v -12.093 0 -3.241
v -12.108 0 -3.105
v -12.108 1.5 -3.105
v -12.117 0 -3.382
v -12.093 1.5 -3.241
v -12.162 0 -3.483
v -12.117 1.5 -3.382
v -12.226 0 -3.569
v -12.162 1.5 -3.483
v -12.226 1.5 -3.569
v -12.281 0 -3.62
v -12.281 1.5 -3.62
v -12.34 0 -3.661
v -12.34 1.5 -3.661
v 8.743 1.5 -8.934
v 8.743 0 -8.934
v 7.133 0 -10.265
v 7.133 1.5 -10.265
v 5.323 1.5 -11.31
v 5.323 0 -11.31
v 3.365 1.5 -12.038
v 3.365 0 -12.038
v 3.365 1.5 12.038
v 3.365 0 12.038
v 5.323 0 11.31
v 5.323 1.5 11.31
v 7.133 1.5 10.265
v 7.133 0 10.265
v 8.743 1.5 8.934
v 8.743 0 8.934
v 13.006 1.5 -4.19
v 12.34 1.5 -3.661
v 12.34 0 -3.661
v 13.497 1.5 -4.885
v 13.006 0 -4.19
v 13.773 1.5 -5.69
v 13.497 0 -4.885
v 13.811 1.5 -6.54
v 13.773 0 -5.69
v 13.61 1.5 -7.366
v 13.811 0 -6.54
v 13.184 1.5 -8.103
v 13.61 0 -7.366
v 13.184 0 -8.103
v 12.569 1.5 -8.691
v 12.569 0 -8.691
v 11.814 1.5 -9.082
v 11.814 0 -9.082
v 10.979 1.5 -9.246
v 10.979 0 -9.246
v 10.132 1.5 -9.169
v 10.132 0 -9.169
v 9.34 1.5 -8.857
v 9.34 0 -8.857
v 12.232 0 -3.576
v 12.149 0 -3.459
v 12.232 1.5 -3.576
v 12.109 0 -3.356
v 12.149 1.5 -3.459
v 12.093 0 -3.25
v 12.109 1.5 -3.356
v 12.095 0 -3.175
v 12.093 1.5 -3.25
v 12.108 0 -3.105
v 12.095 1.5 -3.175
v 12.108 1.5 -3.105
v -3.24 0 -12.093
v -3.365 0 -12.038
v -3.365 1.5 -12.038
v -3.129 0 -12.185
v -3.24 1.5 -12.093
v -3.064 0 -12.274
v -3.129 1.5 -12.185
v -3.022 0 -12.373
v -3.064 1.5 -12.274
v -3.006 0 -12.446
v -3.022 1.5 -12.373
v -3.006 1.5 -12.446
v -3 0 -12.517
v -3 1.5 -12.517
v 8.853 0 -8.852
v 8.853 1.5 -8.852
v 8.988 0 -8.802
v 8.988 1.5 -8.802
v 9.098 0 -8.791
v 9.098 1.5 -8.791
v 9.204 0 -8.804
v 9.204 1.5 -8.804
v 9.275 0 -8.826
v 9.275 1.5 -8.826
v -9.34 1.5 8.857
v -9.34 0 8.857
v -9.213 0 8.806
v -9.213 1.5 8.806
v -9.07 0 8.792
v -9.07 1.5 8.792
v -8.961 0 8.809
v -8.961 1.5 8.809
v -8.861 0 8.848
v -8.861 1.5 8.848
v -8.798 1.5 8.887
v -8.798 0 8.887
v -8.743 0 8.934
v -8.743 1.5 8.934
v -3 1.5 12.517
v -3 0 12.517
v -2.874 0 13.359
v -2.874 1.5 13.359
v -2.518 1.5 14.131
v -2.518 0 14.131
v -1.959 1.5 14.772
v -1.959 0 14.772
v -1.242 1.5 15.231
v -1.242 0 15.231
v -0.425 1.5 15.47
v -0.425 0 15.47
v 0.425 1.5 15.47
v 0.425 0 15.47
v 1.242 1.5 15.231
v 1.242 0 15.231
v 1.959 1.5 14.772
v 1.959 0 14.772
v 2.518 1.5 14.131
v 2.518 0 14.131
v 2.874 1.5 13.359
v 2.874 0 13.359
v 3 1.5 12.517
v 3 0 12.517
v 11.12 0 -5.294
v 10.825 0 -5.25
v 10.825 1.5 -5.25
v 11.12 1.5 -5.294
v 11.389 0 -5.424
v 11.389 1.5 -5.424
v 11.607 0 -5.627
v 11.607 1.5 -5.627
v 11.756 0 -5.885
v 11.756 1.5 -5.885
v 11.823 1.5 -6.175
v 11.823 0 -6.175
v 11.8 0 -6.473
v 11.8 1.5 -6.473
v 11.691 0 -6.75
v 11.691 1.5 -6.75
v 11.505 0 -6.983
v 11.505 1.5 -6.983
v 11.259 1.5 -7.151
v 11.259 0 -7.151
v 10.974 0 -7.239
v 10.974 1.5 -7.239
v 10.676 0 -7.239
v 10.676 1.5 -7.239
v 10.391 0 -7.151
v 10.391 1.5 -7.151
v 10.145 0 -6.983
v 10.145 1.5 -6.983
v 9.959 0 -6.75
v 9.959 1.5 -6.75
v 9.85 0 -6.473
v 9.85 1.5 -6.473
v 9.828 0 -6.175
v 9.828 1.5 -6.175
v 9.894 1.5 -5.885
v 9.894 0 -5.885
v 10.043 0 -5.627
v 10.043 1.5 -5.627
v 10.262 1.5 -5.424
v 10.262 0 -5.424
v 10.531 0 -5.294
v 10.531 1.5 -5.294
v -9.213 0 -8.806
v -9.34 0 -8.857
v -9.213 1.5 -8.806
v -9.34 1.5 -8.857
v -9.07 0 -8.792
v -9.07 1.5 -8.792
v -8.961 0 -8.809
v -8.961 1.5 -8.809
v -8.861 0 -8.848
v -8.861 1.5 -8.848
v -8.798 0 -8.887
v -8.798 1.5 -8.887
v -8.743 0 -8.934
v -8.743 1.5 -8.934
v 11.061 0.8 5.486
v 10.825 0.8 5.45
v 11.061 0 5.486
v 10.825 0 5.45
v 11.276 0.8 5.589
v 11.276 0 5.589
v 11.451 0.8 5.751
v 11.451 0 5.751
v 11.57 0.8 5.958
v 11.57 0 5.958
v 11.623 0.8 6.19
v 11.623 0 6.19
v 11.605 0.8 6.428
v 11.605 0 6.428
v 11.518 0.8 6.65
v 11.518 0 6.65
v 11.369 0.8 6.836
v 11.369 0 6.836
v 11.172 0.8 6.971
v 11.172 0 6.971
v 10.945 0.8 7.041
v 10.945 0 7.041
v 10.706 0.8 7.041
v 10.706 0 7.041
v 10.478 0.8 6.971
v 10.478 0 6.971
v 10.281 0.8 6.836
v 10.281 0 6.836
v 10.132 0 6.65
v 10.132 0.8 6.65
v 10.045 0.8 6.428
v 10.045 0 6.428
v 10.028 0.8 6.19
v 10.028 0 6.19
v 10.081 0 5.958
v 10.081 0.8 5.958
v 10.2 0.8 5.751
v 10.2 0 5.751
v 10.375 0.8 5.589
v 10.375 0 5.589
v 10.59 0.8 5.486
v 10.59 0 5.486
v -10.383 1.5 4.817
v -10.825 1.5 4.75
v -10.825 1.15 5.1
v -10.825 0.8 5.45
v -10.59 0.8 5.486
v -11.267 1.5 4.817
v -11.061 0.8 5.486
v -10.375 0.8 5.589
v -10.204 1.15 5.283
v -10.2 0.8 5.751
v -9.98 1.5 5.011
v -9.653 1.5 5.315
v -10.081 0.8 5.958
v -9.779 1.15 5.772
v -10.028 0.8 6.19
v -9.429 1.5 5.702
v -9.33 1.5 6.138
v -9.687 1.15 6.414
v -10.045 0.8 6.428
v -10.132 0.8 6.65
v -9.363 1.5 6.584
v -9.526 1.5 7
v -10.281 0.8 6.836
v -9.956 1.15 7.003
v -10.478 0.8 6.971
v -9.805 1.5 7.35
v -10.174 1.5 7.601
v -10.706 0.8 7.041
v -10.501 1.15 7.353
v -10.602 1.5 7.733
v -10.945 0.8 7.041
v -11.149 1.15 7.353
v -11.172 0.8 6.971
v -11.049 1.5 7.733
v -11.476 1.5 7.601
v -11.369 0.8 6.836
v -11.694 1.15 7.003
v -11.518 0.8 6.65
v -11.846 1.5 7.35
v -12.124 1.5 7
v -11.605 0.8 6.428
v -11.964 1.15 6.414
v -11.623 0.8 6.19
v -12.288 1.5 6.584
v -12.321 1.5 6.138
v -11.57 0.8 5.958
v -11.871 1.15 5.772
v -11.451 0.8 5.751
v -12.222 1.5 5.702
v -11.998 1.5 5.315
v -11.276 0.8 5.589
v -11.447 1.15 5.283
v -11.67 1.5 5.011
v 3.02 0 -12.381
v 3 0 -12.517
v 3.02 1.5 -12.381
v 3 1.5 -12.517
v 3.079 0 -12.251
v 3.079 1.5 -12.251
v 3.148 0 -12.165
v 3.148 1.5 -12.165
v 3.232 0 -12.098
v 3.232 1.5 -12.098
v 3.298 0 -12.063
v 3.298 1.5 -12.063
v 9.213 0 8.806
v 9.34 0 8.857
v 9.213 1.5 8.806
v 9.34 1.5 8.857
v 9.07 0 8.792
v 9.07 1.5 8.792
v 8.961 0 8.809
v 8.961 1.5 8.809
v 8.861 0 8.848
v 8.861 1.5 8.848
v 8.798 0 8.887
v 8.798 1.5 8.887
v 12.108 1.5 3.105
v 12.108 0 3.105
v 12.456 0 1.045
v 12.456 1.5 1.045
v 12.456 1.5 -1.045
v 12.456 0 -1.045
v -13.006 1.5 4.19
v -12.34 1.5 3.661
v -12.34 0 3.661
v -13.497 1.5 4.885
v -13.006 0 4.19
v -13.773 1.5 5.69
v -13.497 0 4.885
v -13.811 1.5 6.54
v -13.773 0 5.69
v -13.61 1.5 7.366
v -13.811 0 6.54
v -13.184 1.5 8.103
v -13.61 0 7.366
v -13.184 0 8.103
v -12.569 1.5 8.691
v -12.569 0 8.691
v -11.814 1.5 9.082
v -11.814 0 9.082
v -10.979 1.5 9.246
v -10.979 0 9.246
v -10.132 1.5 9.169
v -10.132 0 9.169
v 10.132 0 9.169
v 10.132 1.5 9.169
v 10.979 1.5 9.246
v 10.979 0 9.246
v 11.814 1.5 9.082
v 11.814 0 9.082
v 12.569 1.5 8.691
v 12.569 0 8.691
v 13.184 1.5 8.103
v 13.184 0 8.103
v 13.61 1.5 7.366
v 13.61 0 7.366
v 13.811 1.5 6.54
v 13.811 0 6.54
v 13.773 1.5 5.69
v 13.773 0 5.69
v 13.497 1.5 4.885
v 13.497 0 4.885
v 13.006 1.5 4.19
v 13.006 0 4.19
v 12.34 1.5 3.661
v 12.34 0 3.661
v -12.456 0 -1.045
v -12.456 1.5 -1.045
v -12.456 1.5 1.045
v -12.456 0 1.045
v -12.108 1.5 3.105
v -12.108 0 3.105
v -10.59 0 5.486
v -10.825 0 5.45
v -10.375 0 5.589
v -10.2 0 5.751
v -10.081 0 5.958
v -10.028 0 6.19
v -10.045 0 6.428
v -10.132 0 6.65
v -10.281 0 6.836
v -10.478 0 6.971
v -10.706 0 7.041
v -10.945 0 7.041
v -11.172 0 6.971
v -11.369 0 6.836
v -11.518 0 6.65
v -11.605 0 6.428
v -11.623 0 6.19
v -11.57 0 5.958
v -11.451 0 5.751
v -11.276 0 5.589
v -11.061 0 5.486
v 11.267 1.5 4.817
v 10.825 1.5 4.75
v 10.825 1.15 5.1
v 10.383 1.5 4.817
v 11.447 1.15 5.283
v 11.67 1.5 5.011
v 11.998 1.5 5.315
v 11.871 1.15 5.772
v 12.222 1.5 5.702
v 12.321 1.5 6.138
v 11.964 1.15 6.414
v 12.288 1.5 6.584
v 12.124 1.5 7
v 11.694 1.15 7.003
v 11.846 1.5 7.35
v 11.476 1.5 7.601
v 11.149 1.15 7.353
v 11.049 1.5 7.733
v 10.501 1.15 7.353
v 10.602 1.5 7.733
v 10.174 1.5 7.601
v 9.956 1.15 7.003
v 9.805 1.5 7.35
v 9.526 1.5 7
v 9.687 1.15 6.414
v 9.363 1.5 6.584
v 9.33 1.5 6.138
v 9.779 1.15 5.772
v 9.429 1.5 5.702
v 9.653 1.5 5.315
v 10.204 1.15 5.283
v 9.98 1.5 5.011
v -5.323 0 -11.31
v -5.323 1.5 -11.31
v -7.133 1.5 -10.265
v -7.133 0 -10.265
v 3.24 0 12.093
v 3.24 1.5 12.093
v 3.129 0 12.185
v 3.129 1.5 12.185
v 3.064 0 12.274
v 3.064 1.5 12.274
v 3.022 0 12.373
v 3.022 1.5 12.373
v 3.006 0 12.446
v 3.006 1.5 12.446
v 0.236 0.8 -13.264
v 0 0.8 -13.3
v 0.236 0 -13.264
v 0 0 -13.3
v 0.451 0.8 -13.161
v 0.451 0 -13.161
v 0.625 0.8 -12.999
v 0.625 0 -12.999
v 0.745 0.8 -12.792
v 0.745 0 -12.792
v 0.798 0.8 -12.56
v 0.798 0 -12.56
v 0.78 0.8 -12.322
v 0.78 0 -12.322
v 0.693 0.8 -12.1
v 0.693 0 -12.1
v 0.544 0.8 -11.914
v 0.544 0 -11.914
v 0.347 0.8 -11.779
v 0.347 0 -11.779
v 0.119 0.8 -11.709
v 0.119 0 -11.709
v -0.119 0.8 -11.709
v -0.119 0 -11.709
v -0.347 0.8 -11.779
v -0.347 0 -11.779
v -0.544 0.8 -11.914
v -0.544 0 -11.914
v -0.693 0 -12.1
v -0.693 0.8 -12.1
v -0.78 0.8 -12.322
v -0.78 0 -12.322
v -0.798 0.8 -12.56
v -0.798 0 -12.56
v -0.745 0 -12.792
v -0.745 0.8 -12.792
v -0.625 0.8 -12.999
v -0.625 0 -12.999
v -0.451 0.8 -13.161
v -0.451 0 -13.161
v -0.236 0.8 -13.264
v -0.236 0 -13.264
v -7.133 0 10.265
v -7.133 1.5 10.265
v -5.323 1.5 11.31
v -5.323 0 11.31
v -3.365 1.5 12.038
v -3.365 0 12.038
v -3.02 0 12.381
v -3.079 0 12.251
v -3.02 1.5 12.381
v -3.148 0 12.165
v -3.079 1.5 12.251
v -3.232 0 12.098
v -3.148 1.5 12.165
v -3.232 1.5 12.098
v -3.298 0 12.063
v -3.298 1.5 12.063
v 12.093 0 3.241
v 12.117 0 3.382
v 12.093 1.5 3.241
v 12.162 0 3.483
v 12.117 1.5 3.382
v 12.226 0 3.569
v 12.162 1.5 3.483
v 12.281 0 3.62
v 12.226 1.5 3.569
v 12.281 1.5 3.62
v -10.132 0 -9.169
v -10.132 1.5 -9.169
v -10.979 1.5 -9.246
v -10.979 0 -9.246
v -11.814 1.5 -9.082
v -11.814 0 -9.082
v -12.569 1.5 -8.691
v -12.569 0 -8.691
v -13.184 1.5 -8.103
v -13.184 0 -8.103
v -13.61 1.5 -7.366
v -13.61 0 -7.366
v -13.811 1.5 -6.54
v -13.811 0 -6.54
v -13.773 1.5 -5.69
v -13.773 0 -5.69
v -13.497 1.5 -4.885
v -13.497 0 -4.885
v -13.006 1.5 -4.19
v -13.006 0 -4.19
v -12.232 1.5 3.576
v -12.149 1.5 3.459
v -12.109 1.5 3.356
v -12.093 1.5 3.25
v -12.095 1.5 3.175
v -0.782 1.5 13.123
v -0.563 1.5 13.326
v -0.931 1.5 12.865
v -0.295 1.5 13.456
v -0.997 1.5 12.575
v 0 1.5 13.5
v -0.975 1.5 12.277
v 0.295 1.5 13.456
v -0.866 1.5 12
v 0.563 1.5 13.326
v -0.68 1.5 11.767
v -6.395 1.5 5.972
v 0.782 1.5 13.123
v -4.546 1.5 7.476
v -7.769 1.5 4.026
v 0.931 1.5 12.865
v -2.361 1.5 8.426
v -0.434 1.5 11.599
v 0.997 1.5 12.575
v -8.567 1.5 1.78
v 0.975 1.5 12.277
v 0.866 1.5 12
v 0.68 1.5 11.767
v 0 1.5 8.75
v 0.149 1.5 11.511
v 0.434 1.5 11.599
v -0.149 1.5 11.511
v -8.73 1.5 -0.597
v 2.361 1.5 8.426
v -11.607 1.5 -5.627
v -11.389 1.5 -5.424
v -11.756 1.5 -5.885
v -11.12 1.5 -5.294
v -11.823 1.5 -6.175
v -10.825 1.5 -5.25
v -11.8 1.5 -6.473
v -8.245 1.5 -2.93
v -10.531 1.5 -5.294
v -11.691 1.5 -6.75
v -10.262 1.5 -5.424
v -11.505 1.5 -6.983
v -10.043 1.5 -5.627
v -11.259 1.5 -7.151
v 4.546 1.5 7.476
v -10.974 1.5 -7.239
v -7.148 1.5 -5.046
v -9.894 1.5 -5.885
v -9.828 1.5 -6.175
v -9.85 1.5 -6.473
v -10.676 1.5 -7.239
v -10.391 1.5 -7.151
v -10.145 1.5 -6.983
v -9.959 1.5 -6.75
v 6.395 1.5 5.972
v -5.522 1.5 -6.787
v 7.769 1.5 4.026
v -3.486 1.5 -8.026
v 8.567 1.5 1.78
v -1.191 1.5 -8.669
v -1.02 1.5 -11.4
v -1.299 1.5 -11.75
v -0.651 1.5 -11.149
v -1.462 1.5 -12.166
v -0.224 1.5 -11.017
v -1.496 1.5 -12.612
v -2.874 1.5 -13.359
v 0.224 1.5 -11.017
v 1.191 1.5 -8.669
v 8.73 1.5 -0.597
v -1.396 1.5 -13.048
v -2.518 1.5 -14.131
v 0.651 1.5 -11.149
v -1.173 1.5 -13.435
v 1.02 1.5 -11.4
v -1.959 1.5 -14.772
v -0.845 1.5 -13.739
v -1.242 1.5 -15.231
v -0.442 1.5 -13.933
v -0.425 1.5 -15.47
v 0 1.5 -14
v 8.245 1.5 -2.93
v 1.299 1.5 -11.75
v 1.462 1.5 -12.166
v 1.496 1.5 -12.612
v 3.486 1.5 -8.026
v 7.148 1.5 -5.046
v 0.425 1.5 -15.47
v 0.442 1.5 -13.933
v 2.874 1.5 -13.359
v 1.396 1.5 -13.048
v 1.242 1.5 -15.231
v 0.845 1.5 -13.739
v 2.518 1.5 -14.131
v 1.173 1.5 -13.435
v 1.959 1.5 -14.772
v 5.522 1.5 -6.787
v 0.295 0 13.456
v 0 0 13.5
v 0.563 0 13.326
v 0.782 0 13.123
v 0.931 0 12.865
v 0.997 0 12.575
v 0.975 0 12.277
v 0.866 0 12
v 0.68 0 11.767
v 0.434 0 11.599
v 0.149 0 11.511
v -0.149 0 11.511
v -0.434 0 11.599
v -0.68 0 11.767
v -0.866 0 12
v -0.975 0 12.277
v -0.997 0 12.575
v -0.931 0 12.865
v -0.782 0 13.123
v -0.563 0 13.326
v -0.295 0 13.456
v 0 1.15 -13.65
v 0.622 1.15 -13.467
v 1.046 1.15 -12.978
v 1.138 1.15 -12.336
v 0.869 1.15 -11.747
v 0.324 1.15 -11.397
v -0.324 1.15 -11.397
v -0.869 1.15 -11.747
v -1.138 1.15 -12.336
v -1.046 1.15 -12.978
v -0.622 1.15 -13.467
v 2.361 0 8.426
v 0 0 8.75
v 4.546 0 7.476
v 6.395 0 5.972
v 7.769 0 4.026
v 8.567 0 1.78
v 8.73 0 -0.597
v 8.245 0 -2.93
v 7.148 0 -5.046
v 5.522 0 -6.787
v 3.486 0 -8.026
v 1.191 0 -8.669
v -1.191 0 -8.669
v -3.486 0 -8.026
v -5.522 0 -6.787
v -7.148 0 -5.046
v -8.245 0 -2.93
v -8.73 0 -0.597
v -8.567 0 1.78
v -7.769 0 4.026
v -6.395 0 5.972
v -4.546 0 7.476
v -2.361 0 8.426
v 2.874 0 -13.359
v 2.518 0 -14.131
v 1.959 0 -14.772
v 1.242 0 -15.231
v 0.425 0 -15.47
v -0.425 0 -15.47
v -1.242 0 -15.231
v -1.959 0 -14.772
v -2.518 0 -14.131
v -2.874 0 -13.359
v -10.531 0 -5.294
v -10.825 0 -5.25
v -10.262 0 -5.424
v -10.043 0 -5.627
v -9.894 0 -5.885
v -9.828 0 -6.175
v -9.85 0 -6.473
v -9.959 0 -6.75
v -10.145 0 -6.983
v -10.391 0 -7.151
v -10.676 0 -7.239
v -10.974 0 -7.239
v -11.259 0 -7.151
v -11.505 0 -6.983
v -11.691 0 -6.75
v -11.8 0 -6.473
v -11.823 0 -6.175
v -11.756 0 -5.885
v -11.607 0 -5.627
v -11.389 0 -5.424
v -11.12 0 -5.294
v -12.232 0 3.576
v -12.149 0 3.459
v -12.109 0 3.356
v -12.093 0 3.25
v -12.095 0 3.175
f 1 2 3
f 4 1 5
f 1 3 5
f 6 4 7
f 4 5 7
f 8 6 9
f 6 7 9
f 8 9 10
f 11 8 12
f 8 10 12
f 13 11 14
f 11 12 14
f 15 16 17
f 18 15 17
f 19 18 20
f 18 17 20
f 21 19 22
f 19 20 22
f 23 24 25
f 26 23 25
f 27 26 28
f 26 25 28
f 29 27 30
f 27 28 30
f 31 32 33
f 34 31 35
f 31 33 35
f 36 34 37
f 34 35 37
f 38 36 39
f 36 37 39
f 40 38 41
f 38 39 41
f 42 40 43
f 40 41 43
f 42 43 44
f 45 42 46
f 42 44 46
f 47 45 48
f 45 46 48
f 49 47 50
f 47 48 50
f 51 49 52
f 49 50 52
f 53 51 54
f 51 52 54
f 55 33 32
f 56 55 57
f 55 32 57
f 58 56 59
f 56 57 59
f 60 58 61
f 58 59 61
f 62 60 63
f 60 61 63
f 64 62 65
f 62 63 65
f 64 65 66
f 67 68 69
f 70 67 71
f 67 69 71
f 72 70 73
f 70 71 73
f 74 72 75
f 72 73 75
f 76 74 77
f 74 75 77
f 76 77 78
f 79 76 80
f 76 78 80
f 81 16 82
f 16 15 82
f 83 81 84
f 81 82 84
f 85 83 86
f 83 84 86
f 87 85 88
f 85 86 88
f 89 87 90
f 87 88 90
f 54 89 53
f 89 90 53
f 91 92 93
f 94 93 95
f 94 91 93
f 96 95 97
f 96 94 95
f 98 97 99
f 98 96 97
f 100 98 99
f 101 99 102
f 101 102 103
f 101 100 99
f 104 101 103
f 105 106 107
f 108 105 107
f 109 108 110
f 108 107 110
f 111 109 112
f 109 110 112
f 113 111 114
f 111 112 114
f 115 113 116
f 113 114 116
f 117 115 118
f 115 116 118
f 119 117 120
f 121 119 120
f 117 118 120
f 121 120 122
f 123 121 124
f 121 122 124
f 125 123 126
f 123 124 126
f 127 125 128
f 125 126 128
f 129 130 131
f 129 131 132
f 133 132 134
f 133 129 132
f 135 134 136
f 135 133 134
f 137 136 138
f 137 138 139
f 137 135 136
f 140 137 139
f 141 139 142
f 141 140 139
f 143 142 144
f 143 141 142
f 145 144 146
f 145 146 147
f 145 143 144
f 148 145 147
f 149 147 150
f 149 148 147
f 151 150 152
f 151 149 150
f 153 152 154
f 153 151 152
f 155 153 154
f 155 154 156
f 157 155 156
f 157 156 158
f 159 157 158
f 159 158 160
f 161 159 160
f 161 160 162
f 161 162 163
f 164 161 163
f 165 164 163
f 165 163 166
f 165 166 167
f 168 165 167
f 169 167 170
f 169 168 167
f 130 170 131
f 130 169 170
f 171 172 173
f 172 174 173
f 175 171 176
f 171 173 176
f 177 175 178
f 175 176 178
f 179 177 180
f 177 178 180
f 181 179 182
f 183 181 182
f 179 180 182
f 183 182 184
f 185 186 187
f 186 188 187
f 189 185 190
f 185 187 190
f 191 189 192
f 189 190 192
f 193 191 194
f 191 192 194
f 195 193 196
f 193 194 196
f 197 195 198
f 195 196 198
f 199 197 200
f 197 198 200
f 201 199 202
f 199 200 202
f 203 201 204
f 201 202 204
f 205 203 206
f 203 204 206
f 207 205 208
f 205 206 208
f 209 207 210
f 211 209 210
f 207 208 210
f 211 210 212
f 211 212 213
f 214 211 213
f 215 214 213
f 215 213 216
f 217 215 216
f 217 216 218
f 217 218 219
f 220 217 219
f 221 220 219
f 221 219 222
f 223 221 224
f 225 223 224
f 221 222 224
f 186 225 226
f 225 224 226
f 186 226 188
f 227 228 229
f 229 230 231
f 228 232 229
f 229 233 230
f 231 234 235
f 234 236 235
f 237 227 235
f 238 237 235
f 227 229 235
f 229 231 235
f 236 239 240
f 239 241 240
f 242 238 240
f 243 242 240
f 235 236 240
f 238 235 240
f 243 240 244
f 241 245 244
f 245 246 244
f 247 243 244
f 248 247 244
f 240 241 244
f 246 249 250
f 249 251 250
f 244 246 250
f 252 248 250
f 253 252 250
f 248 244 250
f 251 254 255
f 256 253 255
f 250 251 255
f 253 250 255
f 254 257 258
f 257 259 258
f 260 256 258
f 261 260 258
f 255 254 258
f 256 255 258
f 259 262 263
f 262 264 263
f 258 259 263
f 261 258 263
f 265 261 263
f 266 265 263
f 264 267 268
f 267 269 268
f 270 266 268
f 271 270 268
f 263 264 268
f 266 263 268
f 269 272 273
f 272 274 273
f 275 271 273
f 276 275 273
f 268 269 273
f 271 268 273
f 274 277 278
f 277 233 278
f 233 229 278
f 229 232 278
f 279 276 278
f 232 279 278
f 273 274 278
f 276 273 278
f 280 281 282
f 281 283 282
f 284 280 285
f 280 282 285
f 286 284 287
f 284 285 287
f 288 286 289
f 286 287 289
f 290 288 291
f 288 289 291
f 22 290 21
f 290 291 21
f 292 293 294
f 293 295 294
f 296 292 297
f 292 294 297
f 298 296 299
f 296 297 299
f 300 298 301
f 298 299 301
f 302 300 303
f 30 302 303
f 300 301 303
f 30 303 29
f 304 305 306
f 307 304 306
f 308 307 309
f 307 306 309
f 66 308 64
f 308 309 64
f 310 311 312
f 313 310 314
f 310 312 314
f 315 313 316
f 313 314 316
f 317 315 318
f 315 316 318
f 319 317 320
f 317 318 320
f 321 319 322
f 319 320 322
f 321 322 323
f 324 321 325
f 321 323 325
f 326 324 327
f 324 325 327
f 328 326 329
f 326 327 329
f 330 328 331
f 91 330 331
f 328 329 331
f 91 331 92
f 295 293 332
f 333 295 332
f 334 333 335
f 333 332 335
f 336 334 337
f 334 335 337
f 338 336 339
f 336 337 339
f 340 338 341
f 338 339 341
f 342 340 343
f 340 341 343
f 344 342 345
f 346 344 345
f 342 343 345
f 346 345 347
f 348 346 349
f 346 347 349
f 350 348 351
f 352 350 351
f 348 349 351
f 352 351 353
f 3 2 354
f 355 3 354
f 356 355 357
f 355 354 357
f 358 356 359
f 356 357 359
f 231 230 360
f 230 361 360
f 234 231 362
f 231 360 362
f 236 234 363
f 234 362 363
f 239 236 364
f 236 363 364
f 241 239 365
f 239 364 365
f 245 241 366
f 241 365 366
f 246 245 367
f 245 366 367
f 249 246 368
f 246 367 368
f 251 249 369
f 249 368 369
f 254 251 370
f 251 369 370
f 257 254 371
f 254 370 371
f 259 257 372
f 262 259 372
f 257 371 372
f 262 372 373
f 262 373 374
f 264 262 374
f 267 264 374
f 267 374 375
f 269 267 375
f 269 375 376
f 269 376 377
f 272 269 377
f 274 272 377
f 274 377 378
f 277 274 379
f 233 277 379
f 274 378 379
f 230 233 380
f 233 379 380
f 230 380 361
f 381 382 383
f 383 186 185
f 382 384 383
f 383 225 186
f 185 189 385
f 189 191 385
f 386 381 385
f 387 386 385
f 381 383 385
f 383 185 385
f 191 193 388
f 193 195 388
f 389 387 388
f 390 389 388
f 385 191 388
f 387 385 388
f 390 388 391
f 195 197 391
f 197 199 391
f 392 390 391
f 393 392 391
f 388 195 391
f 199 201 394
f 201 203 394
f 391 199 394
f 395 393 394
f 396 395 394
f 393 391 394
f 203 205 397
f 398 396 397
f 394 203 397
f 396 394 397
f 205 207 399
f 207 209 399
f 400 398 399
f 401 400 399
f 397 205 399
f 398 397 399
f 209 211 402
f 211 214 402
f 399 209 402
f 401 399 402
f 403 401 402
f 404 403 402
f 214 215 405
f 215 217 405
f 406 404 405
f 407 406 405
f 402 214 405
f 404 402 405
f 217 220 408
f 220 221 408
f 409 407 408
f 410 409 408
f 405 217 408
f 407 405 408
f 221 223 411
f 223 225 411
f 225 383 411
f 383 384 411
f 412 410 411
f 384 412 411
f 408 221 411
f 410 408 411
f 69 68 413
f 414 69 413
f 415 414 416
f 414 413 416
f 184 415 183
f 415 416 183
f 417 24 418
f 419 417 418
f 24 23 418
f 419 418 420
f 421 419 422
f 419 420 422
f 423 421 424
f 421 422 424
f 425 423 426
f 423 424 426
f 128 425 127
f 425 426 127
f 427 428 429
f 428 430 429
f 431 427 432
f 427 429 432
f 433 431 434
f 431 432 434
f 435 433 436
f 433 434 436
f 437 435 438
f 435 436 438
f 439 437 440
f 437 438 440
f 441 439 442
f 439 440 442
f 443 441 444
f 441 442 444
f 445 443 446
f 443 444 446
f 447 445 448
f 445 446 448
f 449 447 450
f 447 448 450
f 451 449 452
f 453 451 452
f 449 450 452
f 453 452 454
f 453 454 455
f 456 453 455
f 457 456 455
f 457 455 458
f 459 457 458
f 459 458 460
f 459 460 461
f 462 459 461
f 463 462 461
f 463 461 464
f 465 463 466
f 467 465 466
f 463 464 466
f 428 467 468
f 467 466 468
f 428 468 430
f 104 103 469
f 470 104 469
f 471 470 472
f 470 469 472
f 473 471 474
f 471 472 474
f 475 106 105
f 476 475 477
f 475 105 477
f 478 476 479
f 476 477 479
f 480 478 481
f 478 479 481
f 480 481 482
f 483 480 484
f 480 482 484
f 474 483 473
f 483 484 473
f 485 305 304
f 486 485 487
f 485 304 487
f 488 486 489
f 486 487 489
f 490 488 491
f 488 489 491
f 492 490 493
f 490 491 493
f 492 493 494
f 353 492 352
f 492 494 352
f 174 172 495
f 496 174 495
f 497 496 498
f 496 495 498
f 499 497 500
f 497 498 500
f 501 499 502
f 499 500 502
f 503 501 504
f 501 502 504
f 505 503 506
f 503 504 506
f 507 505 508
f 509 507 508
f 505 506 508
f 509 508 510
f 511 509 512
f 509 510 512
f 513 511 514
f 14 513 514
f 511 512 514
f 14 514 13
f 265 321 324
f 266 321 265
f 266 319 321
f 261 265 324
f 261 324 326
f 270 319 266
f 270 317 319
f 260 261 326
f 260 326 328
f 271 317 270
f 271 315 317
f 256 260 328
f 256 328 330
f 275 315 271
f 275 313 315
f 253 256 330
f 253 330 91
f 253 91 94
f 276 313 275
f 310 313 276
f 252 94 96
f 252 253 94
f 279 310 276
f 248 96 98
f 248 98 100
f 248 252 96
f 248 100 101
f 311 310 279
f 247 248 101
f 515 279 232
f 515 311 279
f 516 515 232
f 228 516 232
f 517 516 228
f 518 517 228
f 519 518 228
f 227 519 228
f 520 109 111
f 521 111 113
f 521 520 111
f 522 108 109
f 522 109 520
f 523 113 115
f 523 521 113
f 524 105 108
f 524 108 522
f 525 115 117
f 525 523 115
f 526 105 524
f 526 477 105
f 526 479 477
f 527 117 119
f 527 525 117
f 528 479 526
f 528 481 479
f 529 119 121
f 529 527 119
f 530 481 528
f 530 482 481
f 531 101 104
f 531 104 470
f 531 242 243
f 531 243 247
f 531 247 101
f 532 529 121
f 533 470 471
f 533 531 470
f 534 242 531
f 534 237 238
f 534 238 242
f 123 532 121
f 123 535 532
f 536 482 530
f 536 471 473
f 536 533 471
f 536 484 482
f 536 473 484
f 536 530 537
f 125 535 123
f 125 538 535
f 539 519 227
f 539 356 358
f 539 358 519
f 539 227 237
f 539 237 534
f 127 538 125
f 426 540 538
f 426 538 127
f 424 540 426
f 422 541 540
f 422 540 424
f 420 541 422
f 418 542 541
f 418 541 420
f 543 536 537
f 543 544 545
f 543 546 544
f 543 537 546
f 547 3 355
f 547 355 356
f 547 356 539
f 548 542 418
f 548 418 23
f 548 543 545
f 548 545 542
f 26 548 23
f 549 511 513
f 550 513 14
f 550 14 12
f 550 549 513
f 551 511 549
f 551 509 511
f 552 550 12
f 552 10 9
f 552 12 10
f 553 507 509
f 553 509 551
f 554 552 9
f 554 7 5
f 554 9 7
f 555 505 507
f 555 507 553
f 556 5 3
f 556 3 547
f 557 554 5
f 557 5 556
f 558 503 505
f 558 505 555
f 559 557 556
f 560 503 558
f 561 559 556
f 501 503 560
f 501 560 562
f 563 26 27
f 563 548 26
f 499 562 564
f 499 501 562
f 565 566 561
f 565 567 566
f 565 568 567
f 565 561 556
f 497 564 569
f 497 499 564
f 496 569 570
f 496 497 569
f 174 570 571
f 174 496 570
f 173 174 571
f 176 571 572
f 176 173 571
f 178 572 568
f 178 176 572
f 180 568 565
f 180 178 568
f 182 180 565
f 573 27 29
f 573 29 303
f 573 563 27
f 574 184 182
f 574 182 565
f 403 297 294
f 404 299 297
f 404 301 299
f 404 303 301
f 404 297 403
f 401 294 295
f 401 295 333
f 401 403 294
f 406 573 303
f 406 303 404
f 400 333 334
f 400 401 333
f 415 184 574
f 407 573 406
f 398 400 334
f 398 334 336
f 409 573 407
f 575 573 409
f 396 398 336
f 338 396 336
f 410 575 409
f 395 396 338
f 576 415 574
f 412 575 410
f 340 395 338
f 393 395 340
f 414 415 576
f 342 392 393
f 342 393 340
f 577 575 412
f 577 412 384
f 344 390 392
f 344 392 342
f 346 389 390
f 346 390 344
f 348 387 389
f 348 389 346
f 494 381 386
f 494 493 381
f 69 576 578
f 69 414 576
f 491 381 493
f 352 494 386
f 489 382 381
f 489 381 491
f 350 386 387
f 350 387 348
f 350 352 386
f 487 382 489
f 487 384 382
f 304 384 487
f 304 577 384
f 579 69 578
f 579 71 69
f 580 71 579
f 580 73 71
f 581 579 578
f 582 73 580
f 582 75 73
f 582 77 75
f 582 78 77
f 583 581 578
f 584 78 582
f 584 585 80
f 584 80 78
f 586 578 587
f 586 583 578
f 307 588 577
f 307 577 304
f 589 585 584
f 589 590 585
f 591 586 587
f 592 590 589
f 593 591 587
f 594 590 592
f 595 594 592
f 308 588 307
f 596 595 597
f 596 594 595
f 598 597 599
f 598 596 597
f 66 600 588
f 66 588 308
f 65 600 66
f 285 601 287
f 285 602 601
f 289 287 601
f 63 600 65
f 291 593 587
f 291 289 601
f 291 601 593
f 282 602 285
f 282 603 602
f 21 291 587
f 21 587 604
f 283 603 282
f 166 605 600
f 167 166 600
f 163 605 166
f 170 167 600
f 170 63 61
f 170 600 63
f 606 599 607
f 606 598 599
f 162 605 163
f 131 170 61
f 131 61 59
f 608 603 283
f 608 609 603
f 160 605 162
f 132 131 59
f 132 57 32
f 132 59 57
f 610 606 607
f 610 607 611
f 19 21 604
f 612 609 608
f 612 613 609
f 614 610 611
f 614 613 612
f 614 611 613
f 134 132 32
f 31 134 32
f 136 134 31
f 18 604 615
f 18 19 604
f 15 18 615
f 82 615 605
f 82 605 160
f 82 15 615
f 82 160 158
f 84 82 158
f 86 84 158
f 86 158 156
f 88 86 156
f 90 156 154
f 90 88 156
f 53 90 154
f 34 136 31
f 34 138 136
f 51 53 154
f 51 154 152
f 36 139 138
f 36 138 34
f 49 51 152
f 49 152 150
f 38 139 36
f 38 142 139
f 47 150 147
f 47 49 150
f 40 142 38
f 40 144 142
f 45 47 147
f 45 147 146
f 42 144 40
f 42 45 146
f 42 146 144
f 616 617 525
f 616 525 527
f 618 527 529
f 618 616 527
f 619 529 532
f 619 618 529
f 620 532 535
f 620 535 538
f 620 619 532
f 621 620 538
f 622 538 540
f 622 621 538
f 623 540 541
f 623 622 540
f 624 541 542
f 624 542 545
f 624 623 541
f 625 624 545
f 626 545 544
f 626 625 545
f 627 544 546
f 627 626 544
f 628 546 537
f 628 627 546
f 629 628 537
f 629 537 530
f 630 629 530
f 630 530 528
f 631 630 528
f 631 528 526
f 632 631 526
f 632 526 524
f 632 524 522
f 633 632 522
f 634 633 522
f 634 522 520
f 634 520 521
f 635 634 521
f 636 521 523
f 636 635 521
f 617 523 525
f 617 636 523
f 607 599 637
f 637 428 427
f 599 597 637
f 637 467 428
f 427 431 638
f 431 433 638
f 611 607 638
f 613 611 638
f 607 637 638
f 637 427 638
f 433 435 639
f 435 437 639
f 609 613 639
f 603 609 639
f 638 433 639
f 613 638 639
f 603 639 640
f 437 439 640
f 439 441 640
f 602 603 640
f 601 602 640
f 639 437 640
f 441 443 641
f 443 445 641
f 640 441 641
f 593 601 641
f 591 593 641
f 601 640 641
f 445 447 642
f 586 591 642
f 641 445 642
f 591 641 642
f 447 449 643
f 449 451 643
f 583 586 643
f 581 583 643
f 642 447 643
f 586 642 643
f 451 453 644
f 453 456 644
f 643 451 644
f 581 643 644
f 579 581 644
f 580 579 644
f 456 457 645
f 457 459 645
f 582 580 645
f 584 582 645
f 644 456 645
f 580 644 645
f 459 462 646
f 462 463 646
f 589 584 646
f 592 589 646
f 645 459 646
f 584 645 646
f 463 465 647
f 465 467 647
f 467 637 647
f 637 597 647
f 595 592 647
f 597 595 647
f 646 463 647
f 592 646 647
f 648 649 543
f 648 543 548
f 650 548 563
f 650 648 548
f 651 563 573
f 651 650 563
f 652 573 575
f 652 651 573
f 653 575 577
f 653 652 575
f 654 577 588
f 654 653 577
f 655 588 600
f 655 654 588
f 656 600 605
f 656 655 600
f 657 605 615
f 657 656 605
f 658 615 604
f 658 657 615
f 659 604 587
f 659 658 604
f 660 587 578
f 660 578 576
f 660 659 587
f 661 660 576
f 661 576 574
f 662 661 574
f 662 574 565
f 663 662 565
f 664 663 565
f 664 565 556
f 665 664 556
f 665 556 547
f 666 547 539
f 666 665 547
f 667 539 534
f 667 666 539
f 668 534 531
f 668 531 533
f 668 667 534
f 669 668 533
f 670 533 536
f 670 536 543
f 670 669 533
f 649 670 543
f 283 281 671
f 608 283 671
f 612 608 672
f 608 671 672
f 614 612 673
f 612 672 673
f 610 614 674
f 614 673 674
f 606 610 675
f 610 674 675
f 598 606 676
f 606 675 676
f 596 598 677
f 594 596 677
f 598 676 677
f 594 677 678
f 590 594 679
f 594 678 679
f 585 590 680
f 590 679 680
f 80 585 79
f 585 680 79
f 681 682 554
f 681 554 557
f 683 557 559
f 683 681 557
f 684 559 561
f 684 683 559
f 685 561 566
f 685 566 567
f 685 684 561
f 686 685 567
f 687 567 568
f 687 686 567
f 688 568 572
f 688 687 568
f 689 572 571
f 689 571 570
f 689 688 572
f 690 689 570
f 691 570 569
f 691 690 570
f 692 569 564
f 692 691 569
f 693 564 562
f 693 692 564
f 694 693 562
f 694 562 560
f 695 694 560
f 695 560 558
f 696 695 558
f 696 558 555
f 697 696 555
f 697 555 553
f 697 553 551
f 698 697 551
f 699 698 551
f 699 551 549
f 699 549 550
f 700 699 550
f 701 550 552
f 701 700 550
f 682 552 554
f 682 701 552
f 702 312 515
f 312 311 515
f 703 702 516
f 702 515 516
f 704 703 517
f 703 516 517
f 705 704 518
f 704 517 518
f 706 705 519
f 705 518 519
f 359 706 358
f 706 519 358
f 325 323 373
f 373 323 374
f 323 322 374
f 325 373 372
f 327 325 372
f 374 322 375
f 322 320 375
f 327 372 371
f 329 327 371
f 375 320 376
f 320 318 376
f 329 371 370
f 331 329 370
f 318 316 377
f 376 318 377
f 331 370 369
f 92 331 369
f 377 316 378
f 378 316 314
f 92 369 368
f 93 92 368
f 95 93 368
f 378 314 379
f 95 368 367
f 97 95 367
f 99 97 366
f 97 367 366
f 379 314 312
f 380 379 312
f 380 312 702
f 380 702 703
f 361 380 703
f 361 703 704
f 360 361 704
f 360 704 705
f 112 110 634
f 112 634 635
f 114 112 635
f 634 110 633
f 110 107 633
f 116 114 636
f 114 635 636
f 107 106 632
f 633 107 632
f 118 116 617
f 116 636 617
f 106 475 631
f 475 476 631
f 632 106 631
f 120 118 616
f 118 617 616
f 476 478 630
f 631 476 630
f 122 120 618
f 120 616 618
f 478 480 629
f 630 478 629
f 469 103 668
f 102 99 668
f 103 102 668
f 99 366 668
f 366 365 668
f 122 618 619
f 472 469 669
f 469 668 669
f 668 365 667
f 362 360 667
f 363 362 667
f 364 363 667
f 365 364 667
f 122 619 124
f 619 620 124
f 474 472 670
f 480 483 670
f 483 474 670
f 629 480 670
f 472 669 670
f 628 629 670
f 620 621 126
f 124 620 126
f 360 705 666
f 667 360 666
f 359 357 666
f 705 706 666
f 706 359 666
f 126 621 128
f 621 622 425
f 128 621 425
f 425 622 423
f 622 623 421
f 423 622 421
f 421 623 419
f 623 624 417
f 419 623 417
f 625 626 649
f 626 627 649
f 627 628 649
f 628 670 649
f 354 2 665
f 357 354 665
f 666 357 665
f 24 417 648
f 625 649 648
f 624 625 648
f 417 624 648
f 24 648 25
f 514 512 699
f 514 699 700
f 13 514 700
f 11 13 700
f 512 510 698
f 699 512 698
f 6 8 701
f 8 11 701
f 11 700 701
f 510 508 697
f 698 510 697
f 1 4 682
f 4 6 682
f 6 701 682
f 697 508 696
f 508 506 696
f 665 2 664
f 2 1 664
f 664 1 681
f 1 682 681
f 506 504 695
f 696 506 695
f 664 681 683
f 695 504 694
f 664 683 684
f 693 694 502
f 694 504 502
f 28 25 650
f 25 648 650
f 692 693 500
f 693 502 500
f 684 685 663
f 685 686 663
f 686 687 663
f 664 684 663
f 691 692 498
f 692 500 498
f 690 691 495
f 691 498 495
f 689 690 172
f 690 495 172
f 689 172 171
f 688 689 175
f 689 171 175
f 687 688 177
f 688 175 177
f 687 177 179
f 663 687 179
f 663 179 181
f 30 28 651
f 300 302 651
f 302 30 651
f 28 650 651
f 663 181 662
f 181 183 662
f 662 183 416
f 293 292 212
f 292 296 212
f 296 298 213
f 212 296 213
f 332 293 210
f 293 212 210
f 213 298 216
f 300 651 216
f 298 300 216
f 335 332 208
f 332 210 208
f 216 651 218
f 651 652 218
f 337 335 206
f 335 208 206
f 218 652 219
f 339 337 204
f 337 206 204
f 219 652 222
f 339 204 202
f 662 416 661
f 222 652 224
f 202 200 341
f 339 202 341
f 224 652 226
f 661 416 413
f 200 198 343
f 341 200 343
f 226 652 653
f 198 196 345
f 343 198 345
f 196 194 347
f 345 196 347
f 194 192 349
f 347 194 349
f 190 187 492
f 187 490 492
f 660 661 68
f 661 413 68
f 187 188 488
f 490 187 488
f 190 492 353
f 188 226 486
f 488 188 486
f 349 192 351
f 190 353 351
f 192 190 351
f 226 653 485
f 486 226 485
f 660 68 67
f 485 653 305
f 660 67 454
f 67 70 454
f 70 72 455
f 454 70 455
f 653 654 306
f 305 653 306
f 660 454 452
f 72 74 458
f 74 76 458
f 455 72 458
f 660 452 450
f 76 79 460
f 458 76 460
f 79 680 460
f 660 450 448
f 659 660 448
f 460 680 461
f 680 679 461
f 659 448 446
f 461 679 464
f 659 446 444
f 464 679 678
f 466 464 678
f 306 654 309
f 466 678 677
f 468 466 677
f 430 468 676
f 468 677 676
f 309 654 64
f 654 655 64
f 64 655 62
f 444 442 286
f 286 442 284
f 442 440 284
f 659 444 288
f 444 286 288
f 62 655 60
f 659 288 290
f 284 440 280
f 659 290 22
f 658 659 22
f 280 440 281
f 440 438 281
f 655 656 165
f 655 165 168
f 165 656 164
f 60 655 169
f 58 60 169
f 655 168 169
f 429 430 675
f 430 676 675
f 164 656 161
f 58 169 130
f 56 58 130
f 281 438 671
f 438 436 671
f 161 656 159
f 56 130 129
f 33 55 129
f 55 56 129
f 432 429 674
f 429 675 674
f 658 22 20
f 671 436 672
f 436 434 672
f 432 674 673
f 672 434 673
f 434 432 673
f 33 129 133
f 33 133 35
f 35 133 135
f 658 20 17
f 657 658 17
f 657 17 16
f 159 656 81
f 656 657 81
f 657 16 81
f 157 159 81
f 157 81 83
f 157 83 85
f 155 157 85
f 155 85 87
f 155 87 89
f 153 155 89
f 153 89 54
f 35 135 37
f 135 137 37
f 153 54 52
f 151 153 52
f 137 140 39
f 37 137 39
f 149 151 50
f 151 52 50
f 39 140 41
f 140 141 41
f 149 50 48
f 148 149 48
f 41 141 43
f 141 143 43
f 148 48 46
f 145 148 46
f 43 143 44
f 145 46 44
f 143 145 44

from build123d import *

# Parameters (mm, degrees)
SKETCH1_R                     = 8.75
SKETCH1_R_2                   = 1
BOSS_EXTRUDE1_DEPTH           = 1.5
CSK_FOR_M3_SFHCS1_D           = 1.6
CSK_FOR_M3_SFHCS1_DEPTH       = 7.5
CSK_FOR_M3_SFHCS1_CSINK_D     = 3
CSK_FOR_M3_SFHCS1_CSINK_ANGLE = 90
CSK_FOR_M3_SFHCS1_TIP         = 0.480688495
FILLET1_R                     = 0.5


with BuildPart() as part:
    # Sketch1 → Boss-Extrude1 (new body)
    with BuildSketch(Plane(origin=(0, 0, 0), x_dir=(1, 0, 0), z_dir=(0, 1, 0))):
        with BuildLine():
            Line((-3, -12.1346611), (-3, -12.5))
            ThreePointArc((-3, -12.5), (0, -15.5), (3, -12.5))
            Line((3, -12.5), (3, -12.1346611))
            ThreePointArc((3, -12.1346611), (6.25, -10.825317547), (9.008924778, -8.665406761))
            Line((9.008924778, -8.665406761), (9.325317547, -8.848076211))
            ThreePointArc((9.325317547, -8.848076211), (13.423393759, -7.75), (12.325317547, -3.651923789))
            Line((12.325317547, -3.651923789), (12.008924778, -3.469254338))
            ThreePointArc((12.008924778, -3.469254338), (12.5, 0), (12.008924778, 3.469254338))
            Line((12.008924778, 3.469254338), (12.325317547, 3.651923789))
            ThreePointArc((12.325317547, 3.651923789), (13.423393759, 7.75), (9.325317547, 8.848076211))
            Line((9.325317547, 8.848076211), (9.008924778, 8.665406761))
            ThreePointArc((9.008924778, 8.665406761), (6.25, 10.825317547), (3, 12.1346611))
            Line((3, 12.1346611), (3, 12.5))
            ThreePointArc((3, 12.5), (0, 15.5), (-3, 12.5))
            Line((-3, 12.5), (-3, 12.1346611))
            ThreePointArc((-3, 12.1346611), (-6.25, 10.825317547), (-9.008924778, 8.665406761))
            Line((-9.008924778, 8.665406761), (-9.325317547, 8.848076211))
            ThreePointArc((-9.325317547, 8.848076211), (-13.423393759, 7.75), (-12.325317547, 3.651923789))
            Line((-12.325317547, 3.651923789), (-12.008924778, 3.469254338))
            ThreePointArc((-12.008924778, 3.469254338), (-12.5, 0), (-12.008924778, -3.469254338))
            Line((-12.008924778, -3.469254338), (-12.325317547, -3.651923789))
            ThreePointArc((-12.325317547, -3.651923789), (-13.423393759, -7.75), (-9.325317547, -8.848076211))
            Line((-9.325317547, -8.848076211), (-9.008924778, -8.665406761))
            ThreePointArc((-9.008924778, -8.665406761), (-6.25, -10.825317547), (-3, -12.1346611))
        make_face()
        with Locations(Location((0, 0, 0), (0, 0, 270))):
            Circle(SKETCH1_R, mode=Mode.SUBTRACT)
        with Locations(Location((-10.825317547, 6.25, 0), (0, 0, 270))):
            Circle(SKETCH1_R_2, mode=Mode.SUBTRACT)
        with Locations(Location((10.825317547, 6.25, 0), (0, 0, 270))):
            Circle(SKETCH1_R_2, mode=Mode.SUBTRACT)
        with Locations(Location((0, -12.5, 0), (0, 0, 270))):
            Circle(SKETCH1_R_2, mode=Mode.SUBTRACT)
    extrude(amount=BOSS_EXTRUDE1_DEPTH)

    # CSK for M3 SFHCS1
    with Locations(Plane(origin=(-10.825317547, 1.5, 6.25), x_dir=(0, 0, 1), z_dir=(0, 1, 0))):
        with Locations((0, 0), (-18.75, 10.825317547), (0, 21.650635094)):
            CounterSinkHole(CSK_FOR_M3_SFHCS1_D / 2, CSK_FOR_M3_SFHCS1_CSINK_D / 2, depth=CSK_FOR_M3_SFHCS1_DEPTH, counter_sink_angle=CSK_FOR_M3_SFHCS1_CSINK_ANGLE)
            with Locations((0, 0, -(CSK_FOR_M3_SFHCS1_DEPTH + CSK_FOR_M3_SFHCS1_TIP / 2))):  # 118° drill point
                Cone(0, CSK_FOR_M3_SFHCS1_D / 2, CSK_FOR_M3_SFHCS1_TIP, mode=Mode.SUBTRACT)

    # Fillet1
    fillet1_edges = [part.edges().sort_by_distance(p)[0] for p in [
        (-3, 0.75, 12.1346611),
        (3, 0.75, 12.1346611),
        (9.008924778, 0.75, 8.665406761),
        (12.008924778, 0.75, 3.469254338),
        (12.008924778, 0.75, -3.469254338),
        (9.008924778, 0.75, -8.665406761),
        (3, 0.75, -12.1346611),
        (-3, 0.75, -12.1346611),
        (-9.008924778, 0.75, -8.665406761),
        (-12.008924778, 0.75, -3.469254338),
        (-12.008924778, 0.75, 3.469254338),
        (-9.008924778, 0.75, 8.665406761),
    ]]
    fillet(fillet1_edges, radius=FILLET1_R)


solid = part.part
